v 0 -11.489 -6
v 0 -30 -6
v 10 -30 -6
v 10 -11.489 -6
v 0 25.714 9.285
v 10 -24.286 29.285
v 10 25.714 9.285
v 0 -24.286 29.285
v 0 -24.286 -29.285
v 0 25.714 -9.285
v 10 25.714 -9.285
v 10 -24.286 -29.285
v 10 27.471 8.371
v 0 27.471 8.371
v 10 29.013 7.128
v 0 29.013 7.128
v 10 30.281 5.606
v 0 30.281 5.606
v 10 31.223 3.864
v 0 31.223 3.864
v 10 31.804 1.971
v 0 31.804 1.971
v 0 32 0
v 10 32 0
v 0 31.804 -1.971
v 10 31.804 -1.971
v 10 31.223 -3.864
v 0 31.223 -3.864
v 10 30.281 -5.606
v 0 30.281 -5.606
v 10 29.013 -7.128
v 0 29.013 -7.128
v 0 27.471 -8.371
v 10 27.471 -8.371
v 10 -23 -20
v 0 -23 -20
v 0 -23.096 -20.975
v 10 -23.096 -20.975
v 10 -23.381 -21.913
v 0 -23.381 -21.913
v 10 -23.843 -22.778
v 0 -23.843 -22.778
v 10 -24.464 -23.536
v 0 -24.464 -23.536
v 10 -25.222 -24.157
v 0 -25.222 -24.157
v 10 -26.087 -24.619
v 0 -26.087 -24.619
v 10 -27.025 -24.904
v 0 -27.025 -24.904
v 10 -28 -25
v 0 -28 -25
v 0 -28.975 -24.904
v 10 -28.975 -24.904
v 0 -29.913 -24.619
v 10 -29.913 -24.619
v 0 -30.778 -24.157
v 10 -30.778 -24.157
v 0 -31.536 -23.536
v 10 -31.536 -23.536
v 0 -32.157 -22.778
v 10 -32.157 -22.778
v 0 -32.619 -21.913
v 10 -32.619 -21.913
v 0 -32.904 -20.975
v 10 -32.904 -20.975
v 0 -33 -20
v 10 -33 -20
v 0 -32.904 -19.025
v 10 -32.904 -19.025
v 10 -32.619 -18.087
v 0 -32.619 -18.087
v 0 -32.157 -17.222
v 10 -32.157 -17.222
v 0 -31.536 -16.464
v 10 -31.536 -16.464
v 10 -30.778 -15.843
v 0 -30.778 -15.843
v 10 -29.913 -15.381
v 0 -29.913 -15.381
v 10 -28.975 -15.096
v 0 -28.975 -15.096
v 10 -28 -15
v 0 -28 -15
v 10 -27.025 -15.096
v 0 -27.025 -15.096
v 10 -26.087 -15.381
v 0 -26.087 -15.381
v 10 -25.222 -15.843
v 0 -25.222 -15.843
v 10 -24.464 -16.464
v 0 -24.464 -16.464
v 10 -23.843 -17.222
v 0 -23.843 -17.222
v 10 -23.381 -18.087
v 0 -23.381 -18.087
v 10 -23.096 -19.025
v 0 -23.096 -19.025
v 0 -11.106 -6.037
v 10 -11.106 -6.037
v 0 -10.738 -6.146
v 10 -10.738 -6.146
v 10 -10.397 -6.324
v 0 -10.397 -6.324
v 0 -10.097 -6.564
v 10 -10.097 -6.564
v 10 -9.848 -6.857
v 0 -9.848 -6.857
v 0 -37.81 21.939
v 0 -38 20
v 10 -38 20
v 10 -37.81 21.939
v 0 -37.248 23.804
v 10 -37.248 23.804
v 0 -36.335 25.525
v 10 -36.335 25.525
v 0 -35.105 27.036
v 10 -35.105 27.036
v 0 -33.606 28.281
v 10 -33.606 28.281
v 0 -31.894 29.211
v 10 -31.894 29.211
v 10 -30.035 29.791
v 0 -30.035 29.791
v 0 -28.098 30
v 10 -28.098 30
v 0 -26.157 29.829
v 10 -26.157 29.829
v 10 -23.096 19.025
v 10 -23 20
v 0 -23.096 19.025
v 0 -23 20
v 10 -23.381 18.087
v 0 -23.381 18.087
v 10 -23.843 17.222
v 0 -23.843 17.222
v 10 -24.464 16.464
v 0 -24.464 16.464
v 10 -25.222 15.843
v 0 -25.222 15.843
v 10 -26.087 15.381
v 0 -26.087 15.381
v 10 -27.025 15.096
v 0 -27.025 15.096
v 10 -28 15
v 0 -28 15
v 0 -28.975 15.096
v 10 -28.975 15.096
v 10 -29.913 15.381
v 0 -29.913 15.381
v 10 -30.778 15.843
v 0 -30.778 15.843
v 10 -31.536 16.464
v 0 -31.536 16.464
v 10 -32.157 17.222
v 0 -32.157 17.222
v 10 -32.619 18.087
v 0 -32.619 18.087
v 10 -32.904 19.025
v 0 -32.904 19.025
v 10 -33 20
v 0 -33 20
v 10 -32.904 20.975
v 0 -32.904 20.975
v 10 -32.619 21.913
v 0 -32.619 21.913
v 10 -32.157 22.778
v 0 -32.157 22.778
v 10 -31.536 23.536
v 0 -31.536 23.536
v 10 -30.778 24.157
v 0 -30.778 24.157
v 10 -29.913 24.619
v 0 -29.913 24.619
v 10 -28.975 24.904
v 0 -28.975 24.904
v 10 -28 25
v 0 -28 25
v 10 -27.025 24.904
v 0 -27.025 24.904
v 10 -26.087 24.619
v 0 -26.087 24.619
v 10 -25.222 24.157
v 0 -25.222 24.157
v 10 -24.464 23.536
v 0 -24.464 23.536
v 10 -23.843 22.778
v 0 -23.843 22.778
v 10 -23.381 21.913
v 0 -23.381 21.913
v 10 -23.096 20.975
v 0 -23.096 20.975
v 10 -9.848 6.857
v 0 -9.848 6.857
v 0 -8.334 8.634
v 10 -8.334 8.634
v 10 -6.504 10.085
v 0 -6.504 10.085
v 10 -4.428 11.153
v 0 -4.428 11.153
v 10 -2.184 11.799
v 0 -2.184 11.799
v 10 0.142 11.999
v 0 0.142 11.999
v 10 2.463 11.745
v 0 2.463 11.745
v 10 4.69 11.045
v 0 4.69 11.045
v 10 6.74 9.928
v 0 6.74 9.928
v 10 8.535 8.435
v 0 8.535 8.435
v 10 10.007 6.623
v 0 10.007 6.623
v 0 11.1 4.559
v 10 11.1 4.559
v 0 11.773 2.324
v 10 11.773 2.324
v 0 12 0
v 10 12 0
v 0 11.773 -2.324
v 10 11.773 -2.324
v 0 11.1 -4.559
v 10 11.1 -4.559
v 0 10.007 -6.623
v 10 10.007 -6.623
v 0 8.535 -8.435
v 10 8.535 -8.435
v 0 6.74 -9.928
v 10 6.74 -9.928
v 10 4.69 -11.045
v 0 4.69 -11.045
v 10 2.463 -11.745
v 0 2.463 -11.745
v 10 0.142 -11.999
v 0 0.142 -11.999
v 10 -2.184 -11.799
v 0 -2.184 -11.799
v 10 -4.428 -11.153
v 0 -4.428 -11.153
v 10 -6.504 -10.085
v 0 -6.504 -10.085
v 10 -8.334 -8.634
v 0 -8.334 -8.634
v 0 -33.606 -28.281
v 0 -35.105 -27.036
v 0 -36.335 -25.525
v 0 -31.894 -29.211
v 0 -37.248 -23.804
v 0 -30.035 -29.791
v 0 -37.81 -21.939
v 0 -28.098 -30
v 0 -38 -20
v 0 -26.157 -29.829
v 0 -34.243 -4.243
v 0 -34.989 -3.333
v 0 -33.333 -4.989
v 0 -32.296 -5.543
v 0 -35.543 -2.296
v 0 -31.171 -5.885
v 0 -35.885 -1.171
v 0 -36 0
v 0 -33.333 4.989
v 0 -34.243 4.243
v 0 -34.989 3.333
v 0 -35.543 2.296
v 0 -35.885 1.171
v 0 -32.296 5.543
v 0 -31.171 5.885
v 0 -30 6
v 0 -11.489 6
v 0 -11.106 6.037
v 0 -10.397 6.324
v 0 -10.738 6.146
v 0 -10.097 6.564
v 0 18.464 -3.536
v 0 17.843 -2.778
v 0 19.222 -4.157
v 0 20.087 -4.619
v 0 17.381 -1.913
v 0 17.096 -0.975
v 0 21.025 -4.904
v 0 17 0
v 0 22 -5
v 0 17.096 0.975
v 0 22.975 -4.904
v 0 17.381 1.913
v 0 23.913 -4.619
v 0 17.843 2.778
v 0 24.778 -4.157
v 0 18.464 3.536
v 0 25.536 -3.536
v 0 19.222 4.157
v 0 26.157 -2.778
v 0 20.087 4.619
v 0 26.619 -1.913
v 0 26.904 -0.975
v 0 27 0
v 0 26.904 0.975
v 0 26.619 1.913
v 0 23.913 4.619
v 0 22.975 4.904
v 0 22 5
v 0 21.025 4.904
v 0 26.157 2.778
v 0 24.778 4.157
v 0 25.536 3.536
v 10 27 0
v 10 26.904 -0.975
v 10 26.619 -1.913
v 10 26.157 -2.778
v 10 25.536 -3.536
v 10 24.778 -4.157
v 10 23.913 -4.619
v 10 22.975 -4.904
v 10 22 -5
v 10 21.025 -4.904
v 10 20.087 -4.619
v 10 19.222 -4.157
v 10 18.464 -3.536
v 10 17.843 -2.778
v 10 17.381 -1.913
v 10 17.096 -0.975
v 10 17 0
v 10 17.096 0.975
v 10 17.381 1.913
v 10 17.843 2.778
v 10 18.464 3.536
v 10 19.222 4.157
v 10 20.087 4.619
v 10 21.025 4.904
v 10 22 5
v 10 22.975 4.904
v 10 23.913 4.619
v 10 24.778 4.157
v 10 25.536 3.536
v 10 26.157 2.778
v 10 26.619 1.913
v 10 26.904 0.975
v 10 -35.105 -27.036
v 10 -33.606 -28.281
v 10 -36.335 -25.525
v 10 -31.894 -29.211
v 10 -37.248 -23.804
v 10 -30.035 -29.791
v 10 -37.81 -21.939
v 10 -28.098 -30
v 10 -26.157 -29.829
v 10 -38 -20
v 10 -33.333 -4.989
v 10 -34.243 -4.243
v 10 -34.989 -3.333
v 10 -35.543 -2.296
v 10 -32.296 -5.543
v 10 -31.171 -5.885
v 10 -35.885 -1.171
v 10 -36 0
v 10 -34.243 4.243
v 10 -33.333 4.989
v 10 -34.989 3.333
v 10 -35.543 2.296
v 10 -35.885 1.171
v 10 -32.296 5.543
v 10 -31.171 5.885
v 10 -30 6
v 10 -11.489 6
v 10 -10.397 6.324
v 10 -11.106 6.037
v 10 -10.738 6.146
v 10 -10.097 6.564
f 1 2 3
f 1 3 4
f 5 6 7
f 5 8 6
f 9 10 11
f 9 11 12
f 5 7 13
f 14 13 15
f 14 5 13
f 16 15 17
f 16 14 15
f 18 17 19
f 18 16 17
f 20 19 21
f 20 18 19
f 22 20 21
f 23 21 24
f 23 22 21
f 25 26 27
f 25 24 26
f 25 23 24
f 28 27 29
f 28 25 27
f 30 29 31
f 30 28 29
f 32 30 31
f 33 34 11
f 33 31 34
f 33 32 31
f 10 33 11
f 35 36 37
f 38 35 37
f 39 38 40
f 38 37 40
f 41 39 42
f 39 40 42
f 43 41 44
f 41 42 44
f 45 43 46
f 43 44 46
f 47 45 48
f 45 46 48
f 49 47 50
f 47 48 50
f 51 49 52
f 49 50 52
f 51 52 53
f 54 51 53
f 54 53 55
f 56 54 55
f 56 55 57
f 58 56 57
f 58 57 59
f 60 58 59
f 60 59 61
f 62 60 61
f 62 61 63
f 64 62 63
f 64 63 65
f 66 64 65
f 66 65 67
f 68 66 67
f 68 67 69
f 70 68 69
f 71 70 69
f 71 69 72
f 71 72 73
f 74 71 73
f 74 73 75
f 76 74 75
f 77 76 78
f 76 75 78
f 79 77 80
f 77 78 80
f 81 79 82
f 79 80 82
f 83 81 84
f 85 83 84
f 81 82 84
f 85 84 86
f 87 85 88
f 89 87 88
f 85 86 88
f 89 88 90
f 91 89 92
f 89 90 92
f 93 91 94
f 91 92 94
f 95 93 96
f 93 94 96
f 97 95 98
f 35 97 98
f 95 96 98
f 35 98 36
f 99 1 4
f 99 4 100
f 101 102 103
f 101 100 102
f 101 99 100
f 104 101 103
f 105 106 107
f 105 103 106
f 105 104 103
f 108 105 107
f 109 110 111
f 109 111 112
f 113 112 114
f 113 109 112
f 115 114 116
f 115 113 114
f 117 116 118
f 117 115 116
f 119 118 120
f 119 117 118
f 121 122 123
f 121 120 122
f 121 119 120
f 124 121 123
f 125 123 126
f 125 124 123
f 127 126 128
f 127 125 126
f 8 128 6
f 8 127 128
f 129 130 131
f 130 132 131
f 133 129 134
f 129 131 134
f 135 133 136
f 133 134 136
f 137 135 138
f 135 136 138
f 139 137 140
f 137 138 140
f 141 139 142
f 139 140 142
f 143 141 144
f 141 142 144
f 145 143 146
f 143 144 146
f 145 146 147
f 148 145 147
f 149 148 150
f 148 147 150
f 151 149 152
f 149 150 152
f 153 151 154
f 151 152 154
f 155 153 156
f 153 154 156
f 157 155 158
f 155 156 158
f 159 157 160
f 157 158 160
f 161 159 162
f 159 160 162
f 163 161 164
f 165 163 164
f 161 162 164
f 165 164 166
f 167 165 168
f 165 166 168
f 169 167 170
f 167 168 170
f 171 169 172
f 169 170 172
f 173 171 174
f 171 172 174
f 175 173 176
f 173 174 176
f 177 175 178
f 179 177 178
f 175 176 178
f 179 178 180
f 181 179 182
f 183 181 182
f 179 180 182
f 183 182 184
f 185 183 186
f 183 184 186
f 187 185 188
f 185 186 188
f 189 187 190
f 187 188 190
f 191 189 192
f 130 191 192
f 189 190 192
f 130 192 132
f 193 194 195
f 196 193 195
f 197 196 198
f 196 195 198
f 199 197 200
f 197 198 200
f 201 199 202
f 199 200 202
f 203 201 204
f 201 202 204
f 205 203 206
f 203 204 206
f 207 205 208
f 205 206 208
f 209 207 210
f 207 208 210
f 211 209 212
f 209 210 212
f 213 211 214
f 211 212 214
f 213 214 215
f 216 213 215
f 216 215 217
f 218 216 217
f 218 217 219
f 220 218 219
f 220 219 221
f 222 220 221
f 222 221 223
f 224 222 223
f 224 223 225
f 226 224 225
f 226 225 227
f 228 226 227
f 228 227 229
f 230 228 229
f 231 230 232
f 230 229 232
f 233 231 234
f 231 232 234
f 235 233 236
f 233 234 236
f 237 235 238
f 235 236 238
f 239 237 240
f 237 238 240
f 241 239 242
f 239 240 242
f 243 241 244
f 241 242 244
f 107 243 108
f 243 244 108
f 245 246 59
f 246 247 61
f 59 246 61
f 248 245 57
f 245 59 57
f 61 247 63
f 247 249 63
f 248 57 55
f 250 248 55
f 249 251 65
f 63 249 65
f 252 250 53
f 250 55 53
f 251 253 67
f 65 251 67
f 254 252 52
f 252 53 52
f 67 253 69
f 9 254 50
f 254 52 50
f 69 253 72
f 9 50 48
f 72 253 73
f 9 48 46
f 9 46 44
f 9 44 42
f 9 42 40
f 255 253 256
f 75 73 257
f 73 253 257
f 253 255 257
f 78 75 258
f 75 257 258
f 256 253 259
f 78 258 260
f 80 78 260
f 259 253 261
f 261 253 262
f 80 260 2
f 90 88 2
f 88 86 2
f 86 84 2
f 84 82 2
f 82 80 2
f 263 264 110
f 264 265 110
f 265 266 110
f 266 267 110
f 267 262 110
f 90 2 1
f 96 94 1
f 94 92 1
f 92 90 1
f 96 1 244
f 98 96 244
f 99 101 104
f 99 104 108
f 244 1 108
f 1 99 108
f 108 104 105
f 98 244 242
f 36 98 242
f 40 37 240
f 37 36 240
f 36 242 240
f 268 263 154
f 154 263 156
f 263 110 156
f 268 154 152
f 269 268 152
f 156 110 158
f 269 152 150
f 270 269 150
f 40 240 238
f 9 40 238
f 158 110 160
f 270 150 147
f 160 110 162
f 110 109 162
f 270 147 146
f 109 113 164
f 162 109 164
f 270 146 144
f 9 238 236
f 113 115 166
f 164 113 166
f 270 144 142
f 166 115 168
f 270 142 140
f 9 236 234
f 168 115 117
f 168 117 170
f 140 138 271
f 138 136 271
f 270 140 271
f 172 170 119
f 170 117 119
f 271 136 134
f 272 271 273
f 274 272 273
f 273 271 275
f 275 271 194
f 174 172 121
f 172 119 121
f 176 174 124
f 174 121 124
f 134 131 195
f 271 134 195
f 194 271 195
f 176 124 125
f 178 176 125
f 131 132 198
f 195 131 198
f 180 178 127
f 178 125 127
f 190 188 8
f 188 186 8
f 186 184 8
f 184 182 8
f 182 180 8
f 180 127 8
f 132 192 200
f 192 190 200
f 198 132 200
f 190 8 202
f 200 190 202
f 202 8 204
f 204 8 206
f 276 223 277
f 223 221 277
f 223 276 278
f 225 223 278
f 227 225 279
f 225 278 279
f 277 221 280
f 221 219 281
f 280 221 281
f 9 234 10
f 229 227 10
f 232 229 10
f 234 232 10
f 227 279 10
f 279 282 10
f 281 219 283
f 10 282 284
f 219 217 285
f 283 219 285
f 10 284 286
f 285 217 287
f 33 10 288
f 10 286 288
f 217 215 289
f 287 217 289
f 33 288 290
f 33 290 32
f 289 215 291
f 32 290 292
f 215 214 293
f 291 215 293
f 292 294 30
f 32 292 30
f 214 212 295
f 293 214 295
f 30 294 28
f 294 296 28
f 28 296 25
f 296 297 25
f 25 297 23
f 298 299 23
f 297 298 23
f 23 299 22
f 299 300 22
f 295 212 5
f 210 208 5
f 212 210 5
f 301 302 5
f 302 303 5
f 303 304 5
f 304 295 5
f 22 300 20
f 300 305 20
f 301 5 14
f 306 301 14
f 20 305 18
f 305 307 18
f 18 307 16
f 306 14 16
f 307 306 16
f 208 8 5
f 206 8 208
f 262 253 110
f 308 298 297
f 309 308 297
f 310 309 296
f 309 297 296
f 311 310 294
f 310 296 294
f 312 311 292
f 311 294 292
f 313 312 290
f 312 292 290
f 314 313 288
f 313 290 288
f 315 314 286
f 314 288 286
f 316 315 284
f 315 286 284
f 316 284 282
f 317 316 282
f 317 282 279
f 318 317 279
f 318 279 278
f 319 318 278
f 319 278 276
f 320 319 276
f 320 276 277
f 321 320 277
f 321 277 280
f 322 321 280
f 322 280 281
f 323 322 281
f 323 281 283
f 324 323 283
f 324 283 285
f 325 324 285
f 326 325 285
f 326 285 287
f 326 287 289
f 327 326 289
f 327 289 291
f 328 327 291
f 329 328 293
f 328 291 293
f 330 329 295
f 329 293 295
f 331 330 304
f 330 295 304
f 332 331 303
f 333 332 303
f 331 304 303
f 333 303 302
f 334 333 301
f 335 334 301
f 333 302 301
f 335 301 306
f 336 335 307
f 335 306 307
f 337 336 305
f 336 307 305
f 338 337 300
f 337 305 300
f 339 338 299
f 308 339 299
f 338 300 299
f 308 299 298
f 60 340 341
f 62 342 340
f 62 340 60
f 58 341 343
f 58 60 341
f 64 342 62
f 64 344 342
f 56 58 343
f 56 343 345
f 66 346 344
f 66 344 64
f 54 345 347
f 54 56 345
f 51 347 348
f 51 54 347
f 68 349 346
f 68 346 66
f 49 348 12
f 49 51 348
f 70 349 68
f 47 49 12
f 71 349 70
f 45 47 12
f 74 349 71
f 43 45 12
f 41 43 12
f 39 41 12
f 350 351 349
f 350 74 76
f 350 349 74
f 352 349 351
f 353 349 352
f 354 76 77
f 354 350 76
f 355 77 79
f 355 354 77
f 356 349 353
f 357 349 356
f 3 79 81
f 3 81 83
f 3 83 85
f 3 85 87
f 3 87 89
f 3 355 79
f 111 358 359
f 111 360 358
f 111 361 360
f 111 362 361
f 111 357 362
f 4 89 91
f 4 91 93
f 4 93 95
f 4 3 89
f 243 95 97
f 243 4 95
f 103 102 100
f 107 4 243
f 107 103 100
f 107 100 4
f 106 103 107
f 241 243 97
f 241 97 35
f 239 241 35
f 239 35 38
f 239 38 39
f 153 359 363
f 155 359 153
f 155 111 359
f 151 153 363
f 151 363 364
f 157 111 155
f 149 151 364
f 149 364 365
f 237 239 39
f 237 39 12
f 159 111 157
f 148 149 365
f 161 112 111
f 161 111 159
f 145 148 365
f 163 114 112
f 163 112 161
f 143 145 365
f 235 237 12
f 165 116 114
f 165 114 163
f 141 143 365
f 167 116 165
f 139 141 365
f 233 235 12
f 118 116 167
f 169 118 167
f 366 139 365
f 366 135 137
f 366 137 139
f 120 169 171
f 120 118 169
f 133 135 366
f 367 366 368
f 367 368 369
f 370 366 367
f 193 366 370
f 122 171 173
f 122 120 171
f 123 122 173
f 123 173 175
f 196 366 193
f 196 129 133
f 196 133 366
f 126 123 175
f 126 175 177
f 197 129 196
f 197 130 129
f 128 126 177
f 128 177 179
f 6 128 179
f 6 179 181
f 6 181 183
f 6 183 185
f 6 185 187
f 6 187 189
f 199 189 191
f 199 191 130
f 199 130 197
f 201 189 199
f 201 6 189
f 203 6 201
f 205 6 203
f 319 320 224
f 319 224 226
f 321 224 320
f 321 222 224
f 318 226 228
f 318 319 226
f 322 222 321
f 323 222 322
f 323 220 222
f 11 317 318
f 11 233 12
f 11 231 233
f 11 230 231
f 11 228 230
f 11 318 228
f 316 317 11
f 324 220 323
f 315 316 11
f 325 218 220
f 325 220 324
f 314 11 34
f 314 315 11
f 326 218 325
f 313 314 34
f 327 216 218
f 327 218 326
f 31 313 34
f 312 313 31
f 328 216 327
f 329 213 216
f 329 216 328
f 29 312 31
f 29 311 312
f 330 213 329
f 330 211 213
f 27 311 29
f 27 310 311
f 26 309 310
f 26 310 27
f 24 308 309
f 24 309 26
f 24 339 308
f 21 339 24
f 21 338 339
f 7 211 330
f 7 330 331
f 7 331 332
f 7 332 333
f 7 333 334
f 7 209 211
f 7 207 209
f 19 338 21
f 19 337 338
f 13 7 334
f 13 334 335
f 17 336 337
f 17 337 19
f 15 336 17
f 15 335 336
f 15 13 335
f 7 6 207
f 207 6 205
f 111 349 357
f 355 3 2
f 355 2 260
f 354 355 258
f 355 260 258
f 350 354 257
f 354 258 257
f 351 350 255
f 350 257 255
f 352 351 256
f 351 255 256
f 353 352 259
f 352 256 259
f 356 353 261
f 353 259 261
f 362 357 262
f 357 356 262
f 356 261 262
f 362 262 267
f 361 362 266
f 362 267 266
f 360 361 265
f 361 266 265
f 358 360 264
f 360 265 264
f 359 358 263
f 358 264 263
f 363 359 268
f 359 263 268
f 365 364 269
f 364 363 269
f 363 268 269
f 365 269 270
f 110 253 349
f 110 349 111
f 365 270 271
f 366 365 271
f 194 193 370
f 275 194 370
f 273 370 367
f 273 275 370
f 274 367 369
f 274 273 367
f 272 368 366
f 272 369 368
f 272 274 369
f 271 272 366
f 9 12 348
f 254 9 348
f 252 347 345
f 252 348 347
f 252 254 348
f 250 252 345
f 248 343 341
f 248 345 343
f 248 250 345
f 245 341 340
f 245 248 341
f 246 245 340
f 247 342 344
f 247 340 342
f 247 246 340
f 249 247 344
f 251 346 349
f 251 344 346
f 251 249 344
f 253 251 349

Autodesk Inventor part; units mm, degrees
ref_plane "YZ Plane" through (0, 0, 0) normal (1, 0, 0) x (0, 1, 0)
ref_plane "XZ Plane" through (0, 0, 0) normal (0, 1, 0) x (-1, 0, 0)
ref_plane "XY Plane" through (0, 0, 0) normal (0, 0, 1) x (1, 0, 0)
sketch "Sketch1" plane through (0, 0, 0) normal (0, 1, 0) x (-1, 0, 0)
  point P0 (0, 0)
extrude "Extrusion1" [suppressed]
sketch "Sketch2" plane through (0, 0, 0) normal (1, 0, 0) x (0, 1, 0)
  arc A0 (-9.8478, -6.8571) -> (-9.8478, 6.8571) centre (0, 0) ccw
  line L0 (0, 0) -> (-30, 0)
  arc A1 (-30, 6) -> (-30, -6) centre (-30, 0) ccw
  line L1 (-30, -6) -> (-11.4891, -6)
  line L2 (-30, 6) -> (-11.4891, 6)
  arc A2 (-9.8478, -6.8571) -> (-11.4891, -6) centre (-11.4891, -8) ccw
  arc A3 (-11.4891, 6) -> (-9.8478, 6.8571) centre (-11.4891, 8) ccw
  line L3 (0, 0) -> (-28, 0)
  line L4 (-28, 0) -> (-28, -20)
  line L5 (-28, -20) -> (-28, 20)
  circle A4 centre (-28, -20) radius 5
  circle A5 centre (-28, 20) radius 5
  line L6 (0, 0) -> (22, 0)
  circle A6 centre (22, 0) radius 5
  circle A7 centre (22, 0) radius 10
  circle A8 centre (-28, -20) radius 10
  circle A9 centre (-28, 20) radius 10
  line L7 (25.7139, -9.2848) -> (-24.2861, -29.2848)
  line L8 (-38, -20) -> (-38, 20)
  line L9 (-24.2861, 29.2848) -> (25.7139, 9.2848)
  point P0 (-10.3923, -6)
  point P1 (-10.3923, 6)
  dimension "d15" = 24
  dimension "d16" = 30
  dimension "d17" = 12
  dimension "d18" = 2
  dimension "d19" = 28
  dimension "d20" = 20
  dimension "d21" = 40
  dimension "d22" = 10
  dimension "d23" = 10
  dimension "d24" = 22
  dimension "d25" = 10
  dimension "d26" = 20
  dimension "d27" = 20
  dimension "d28" = 20
extrude "Extrusion2" add sketch "Sketch2" along normal blind 10 contours A0 A7 L7 A8 L4 L1 A2 | A0 A3 L2 L5 A9 L9 A7 | A7 | L4 A8 L8 A9 L5 L2 A1 L1 | A9 | A8
equation "\"d10\" = 0.5 * d9"
equation "\"d9\" = 6"
